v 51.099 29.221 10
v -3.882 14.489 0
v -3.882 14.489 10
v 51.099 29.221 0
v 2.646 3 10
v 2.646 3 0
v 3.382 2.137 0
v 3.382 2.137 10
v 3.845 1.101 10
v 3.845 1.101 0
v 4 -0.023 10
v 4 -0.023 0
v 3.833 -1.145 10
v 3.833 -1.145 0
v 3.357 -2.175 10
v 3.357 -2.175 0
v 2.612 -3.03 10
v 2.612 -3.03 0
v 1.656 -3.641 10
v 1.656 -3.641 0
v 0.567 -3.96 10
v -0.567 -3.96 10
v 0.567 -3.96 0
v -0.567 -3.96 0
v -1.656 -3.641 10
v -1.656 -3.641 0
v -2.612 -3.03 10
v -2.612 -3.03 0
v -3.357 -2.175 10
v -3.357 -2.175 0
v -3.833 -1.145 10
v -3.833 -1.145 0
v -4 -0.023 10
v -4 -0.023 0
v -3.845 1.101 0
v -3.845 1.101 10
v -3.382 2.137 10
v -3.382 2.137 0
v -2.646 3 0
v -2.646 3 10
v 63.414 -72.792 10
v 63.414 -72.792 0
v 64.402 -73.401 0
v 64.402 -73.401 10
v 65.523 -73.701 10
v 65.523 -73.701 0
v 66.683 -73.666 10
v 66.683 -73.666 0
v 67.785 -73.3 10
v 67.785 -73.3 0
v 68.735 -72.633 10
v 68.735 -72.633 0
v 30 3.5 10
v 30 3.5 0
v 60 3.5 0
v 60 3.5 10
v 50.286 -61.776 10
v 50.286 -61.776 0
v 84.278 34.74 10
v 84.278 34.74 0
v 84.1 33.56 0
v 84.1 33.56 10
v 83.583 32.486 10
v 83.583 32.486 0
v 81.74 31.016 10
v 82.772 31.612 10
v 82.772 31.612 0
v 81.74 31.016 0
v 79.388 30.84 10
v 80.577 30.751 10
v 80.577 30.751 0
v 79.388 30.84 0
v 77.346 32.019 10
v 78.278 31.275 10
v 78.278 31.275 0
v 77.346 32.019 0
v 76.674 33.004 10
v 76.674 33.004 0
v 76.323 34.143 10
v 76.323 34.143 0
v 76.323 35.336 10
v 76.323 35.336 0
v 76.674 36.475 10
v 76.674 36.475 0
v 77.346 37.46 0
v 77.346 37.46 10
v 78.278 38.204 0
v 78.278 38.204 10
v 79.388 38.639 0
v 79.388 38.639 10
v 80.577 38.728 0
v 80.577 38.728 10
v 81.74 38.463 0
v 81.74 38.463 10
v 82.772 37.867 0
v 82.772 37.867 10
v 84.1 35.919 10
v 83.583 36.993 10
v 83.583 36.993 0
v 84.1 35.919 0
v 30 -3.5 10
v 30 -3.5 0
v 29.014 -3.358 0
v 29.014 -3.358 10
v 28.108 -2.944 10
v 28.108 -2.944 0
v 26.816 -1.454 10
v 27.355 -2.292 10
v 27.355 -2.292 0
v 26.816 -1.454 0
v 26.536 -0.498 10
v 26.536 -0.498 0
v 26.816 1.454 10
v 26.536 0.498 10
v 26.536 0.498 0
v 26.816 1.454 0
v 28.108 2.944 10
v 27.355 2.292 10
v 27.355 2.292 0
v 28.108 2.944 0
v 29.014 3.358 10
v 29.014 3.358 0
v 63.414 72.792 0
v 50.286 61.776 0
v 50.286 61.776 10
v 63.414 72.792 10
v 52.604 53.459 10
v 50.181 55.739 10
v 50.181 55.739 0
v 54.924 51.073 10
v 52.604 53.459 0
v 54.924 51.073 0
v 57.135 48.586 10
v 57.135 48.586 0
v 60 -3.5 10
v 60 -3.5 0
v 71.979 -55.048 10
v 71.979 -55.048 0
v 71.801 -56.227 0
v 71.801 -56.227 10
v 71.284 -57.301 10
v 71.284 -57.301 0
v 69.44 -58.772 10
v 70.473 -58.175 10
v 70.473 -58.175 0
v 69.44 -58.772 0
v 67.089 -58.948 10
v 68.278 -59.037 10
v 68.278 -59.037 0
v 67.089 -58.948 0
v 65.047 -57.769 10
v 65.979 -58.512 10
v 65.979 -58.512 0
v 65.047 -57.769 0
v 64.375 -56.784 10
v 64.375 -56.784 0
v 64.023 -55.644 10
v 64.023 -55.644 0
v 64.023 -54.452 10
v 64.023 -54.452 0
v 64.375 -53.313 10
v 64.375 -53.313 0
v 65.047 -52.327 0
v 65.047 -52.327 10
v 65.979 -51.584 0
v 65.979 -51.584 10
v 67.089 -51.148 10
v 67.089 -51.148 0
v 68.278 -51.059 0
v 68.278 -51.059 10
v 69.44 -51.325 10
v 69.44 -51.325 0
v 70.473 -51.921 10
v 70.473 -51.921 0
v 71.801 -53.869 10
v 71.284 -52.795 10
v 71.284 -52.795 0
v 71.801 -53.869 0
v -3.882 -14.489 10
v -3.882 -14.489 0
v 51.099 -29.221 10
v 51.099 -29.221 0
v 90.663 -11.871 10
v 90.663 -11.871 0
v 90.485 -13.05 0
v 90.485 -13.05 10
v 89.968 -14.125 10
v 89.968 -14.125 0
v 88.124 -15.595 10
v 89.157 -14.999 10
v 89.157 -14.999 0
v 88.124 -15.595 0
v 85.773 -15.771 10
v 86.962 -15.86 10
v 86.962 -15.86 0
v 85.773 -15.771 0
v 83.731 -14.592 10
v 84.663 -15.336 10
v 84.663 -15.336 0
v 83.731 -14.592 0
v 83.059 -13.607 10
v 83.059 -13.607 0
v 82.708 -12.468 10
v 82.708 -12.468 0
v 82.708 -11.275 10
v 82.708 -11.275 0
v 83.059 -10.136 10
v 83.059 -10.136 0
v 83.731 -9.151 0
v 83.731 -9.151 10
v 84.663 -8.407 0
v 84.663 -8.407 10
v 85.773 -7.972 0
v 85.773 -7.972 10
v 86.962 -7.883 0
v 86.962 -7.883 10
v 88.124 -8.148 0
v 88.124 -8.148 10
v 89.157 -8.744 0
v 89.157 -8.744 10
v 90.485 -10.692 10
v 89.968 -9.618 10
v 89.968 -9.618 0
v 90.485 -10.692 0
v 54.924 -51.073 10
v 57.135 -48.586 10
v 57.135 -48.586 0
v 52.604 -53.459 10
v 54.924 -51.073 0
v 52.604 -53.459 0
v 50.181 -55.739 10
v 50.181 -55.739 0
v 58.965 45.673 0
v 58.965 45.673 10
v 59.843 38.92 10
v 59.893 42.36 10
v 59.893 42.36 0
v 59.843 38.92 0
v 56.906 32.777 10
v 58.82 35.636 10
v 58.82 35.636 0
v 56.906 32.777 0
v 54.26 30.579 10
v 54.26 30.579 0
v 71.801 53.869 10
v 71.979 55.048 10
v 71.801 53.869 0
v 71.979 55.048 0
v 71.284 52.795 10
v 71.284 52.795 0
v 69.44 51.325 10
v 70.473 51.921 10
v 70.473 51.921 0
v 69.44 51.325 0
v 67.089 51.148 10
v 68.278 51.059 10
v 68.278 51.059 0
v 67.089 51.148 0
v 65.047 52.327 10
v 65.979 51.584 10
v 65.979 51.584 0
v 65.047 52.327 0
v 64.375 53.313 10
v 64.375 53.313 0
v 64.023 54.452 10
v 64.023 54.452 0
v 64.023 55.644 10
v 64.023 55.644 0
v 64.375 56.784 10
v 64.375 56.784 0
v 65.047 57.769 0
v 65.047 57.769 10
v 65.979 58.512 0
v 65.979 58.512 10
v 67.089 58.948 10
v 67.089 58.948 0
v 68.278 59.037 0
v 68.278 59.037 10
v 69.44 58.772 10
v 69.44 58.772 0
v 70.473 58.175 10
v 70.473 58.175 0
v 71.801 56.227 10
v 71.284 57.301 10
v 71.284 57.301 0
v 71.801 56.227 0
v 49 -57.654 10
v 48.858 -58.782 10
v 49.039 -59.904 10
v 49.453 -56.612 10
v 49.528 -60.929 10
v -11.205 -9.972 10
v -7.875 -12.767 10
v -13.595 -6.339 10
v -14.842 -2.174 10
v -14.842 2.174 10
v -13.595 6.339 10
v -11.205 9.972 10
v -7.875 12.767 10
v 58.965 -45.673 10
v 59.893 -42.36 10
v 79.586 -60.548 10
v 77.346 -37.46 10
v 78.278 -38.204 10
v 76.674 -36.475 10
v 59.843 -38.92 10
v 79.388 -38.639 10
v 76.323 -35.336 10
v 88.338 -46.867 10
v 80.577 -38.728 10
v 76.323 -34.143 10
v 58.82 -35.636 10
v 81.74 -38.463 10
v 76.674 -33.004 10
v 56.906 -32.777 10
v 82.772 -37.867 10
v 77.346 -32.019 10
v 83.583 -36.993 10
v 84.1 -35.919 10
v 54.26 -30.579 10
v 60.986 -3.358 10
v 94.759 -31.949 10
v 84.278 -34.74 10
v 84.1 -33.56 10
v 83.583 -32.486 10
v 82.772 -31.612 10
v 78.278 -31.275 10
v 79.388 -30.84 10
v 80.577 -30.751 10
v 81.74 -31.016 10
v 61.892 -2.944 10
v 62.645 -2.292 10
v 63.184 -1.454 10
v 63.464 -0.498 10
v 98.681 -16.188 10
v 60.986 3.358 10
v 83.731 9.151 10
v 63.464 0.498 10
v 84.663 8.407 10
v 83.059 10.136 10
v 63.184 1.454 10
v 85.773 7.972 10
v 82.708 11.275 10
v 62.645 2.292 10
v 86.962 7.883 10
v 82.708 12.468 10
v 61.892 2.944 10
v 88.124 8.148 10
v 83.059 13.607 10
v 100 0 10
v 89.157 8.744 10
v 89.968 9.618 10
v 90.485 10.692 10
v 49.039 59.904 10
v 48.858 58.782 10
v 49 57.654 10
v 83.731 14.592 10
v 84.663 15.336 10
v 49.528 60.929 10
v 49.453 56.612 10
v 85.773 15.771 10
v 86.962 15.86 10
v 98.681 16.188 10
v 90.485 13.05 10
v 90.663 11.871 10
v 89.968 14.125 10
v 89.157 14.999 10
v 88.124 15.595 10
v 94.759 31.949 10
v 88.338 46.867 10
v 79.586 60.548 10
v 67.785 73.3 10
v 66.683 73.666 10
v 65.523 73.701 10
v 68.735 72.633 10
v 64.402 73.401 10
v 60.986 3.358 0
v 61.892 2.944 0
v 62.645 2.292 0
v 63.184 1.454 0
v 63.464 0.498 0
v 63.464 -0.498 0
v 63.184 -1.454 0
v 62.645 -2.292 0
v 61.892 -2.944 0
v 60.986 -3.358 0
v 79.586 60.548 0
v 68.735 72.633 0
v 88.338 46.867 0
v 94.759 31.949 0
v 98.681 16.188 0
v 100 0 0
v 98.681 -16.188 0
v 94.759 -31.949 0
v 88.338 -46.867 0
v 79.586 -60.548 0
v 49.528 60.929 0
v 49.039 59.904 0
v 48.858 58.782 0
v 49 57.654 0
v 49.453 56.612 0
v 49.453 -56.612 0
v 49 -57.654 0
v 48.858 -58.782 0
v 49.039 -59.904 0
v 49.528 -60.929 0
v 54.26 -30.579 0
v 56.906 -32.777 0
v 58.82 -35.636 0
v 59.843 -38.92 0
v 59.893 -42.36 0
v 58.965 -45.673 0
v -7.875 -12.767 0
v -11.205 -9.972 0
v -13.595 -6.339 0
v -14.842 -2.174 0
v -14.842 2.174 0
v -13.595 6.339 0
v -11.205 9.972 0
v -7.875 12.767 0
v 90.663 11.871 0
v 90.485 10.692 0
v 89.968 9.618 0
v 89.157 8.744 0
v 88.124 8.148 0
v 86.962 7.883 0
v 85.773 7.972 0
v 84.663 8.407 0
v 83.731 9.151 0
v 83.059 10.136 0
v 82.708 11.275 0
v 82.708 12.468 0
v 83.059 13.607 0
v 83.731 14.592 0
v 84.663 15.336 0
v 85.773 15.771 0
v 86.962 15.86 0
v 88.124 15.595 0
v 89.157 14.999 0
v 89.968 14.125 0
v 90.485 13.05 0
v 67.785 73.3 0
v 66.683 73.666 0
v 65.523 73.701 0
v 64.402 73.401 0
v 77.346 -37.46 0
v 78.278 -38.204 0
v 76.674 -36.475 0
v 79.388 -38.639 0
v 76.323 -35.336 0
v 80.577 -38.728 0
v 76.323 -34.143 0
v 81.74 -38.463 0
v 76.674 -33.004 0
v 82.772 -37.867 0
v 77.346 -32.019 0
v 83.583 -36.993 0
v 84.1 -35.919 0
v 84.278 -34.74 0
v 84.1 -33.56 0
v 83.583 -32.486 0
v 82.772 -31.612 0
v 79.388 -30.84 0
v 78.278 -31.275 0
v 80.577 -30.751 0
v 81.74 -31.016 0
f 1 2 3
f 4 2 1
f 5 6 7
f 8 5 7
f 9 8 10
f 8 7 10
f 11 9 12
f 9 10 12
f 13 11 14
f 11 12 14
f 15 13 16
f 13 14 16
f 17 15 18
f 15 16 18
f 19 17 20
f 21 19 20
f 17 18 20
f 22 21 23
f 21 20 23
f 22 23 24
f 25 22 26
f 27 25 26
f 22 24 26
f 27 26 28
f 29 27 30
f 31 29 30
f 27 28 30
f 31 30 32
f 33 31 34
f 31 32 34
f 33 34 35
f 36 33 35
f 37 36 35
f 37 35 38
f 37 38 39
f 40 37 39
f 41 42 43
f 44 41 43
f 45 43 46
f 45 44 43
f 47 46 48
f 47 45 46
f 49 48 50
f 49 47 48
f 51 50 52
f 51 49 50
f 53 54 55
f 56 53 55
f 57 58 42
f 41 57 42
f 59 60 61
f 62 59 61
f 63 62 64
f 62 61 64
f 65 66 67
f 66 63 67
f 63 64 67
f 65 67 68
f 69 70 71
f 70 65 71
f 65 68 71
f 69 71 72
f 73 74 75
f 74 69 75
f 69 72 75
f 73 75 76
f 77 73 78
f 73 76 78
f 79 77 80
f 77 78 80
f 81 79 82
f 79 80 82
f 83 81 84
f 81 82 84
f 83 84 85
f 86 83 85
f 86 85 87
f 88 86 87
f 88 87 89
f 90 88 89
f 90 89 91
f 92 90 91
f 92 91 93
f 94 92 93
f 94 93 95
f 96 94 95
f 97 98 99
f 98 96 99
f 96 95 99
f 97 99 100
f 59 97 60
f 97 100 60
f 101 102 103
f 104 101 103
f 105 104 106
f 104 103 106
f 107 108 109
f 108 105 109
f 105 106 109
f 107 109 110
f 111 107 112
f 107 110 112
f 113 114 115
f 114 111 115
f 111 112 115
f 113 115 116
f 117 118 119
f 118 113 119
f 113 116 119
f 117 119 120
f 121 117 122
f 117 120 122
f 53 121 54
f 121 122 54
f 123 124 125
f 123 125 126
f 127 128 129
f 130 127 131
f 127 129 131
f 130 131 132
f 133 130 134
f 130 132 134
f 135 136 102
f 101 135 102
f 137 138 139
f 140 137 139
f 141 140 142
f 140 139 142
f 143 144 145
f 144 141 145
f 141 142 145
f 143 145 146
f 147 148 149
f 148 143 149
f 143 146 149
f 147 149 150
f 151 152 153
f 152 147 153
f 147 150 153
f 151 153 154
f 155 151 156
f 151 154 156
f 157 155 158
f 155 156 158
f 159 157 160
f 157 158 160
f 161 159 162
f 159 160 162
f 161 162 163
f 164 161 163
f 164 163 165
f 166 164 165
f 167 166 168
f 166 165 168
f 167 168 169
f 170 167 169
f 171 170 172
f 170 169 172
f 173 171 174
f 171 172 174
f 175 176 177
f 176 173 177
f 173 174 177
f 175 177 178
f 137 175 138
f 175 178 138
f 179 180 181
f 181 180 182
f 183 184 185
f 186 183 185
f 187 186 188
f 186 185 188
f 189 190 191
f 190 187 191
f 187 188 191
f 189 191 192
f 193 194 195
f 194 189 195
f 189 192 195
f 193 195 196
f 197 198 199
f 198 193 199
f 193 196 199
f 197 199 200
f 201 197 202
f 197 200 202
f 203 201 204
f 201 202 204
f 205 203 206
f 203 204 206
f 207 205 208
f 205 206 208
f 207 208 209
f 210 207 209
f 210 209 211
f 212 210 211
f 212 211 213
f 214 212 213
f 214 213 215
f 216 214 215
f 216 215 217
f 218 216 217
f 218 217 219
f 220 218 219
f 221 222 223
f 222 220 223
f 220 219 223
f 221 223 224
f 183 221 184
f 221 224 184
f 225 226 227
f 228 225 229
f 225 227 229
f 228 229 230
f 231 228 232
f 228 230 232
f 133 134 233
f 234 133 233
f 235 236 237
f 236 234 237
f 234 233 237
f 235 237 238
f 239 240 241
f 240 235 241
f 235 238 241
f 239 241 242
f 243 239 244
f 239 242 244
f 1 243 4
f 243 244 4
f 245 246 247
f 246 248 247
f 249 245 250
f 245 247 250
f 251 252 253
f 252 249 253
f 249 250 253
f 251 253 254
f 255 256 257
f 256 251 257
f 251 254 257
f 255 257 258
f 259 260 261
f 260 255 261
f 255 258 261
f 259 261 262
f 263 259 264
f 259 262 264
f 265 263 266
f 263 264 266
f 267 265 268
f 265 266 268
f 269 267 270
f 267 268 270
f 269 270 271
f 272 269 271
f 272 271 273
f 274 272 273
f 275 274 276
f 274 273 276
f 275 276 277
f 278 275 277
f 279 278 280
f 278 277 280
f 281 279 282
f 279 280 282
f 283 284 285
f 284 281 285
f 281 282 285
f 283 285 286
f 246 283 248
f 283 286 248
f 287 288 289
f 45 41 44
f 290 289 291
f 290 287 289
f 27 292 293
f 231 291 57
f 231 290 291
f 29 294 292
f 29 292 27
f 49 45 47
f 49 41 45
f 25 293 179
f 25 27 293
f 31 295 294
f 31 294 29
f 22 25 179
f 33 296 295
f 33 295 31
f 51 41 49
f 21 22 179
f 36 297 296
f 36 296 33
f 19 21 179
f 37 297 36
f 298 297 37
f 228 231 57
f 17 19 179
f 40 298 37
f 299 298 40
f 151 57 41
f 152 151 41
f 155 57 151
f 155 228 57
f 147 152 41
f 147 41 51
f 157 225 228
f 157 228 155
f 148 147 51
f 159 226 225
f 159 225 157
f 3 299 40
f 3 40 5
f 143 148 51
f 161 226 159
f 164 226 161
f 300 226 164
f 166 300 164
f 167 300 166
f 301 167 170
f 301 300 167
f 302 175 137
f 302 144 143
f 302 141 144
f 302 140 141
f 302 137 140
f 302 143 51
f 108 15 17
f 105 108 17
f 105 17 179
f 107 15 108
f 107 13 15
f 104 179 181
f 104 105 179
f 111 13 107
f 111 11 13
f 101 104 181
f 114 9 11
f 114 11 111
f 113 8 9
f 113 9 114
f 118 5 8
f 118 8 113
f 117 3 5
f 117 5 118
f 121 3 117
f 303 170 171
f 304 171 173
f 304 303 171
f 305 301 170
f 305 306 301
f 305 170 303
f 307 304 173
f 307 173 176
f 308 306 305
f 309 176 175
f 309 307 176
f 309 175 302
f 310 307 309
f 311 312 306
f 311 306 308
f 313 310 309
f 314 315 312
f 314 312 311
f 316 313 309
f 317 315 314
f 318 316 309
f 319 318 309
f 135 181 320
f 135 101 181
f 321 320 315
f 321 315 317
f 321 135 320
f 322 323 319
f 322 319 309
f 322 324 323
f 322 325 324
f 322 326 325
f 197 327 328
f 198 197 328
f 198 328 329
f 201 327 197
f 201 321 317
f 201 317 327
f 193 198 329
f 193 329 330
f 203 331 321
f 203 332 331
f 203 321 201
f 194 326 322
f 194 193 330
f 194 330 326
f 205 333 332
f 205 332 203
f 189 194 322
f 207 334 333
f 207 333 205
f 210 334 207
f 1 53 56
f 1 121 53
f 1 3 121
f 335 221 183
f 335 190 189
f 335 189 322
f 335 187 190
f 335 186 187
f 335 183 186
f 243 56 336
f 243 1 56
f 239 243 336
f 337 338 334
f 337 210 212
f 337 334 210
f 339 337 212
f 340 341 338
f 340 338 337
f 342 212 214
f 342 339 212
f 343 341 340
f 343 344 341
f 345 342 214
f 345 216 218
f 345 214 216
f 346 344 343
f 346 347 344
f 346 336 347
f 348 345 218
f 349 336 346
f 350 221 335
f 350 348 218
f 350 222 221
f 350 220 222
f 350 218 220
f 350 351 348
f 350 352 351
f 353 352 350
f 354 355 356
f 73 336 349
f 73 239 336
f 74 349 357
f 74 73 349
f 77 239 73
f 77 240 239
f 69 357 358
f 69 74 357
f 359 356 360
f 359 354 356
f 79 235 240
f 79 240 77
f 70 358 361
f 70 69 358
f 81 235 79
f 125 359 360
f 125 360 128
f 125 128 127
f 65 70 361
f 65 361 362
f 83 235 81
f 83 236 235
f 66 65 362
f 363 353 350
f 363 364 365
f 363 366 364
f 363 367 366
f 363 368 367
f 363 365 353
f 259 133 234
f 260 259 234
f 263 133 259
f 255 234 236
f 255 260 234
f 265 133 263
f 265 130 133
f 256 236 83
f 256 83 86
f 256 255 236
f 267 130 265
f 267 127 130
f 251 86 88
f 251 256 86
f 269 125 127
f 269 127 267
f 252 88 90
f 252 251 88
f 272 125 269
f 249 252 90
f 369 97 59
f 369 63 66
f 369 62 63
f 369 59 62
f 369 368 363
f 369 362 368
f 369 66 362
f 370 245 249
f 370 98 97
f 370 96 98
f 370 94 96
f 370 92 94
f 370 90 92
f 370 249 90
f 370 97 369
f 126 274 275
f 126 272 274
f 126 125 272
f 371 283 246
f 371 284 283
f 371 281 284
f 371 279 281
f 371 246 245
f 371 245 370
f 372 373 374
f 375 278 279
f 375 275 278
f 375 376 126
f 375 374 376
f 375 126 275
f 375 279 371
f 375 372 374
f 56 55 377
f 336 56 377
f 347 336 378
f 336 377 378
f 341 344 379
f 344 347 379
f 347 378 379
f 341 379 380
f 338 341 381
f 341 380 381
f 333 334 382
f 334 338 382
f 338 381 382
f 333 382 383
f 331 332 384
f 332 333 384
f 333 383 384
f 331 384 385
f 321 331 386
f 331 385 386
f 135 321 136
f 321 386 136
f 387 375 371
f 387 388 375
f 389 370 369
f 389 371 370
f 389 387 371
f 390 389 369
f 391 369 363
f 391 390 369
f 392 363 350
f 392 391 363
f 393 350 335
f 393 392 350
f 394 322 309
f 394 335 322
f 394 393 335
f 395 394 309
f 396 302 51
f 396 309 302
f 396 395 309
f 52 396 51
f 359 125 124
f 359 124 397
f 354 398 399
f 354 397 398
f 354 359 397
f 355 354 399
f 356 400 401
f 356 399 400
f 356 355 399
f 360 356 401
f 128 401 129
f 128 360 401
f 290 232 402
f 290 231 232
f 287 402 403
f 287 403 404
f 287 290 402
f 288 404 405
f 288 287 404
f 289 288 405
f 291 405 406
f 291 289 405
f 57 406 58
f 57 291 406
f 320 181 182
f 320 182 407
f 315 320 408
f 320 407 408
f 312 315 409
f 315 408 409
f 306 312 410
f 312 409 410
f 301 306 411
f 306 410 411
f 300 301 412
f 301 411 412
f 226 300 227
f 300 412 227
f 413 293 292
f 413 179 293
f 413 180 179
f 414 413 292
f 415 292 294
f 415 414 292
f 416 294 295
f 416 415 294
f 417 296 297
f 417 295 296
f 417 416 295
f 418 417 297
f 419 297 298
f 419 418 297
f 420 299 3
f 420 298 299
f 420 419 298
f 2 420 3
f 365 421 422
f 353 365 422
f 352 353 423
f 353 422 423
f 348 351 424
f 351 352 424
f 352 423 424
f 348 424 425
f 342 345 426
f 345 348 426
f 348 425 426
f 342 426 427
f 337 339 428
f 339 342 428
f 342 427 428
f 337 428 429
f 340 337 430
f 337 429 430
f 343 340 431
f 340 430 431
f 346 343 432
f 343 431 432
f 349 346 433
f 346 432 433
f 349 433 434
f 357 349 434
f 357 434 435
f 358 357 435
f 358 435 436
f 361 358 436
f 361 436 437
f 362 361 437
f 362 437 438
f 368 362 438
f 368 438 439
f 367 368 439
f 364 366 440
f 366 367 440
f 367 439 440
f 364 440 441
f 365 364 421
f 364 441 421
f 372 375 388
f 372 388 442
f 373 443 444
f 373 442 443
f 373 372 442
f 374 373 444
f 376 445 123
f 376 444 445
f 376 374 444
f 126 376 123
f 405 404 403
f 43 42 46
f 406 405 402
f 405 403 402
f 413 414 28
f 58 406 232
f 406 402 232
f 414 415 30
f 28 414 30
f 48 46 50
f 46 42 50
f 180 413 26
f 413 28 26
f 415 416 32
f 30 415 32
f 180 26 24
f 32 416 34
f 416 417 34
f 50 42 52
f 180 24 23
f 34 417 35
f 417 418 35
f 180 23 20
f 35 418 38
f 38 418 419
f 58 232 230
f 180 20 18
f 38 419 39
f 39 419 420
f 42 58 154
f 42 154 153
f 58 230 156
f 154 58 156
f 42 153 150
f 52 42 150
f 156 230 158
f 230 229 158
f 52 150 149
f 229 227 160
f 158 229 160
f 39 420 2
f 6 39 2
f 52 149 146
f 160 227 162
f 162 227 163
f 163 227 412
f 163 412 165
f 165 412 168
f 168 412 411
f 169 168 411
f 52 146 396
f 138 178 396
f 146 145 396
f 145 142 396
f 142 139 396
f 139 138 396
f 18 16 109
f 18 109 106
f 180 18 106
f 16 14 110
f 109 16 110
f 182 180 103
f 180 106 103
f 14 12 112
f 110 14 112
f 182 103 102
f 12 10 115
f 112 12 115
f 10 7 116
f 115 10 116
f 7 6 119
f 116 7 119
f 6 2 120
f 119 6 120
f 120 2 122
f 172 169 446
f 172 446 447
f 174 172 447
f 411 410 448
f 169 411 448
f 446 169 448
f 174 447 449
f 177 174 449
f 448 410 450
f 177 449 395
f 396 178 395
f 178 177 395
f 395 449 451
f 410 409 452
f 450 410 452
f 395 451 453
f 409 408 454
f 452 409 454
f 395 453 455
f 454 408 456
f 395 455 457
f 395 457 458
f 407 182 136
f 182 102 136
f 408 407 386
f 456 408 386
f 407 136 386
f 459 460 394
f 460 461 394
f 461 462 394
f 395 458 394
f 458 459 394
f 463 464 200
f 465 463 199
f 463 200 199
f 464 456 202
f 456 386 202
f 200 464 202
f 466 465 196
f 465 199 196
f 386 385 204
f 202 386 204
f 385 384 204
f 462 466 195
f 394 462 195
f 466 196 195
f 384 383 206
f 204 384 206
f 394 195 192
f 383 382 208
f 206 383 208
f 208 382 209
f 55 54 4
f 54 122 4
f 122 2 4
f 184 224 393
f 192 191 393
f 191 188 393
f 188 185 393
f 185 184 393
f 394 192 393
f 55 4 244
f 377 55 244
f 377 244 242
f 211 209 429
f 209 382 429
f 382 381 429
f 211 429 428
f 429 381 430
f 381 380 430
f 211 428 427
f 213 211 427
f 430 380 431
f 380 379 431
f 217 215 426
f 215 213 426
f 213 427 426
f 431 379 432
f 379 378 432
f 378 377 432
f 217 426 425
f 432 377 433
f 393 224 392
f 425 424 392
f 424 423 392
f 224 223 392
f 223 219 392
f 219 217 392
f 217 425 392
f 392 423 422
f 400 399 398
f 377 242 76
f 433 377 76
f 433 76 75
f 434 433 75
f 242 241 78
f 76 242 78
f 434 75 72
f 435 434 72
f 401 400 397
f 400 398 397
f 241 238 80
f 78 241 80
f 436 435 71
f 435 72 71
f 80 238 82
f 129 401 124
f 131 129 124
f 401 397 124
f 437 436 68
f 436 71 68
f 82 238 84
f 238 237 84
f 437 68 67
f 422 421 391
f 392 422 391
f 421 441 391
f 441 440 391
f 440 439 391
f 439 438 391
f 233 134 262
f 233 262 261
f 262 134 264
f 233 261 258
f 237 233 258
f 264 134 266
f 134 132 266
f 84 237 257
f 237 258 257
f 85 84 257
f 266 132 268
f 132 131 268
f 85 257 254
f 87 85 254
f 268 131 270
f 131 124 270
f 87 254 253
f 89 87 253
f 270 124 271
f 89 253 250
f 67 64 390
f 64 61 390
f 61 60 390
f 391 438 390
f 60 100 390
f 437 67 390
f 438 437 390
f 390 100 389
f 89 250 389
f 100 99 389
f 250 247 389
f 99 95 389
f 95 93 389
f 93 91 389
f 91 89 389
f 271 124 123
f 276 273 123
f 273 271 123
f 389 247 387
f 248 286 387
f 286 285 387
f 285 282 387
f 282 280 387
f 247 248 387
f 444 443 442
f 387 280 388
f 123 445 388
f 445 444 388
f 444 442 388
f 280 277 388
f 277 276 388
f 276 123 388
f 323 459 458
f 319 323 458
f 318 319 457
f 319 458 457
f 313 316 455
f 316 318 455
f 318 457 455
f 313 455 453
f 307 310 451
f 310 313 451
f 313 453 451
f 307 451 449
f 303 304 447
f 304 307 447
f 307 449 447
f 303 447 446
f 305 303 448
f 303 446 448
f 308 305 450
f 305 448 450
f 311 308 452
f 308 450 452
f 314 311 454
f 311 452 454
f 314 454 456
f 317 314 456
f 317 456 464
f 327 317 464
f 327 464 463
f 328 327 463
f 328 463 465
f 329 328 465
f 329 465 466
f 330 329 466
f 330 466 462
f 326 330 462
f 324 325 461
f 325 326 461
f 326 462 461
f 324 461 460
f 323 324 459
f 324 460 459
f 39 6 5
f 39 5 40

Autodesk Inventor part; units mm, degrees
ref_plane "YZ Plane" through (0, 0, 0) normal (1, 0, 0) x (0, 1, 0)
ref_plane "XZ Plane" through (0, 0, 0) normal (0, 1, 0) x (-1, 0, 0)
ref_plane "XY Plane" through (0, 0, 0) normal (0, 0, 1) x (1, 0, 0)
sketch "Skizze1" plane through (0, 0, 0) normal (0, 0, 1) x (1, 0, 0)
  circle A0 centre (0, 0) radius 15
  circle A1 centre (0, 0) radius 4
  line L0 (0, 0) -> (15, 0) construction
  line L1 (-9.6418, 11.4907) -> (66.0959, 75.0422) construction
  line L2 (-9.6418, -11.4907) -> (66.0959, -75.0422) construction
  line L3 (66.0959, 75.0422) -> (66.0959, -75.0422) construction
  arc A2 (66.0959, -75.0422) -> (66.0959, 75.0422) centre (0, 0) ccw
  arc A3 (46.6507, -58.7257) -> (46.6507, 58.7257) centre (0, 0) ccw
  line L4 (46.6507, 58.7257) -> (66.0959, 75.0422)
  line L5 (46.6507, -58.7257) -> (66.0959, -75.0422)
  arc A4 (51.0992, 29.2211) -> (57.1349, 48.586) centre (47.9933, 40.8122) ccw
  line L6 (-3.8823, 14.4889) -> (51.0992, 29.2211)
  line L7 (-3.8823, -14.4889) -> (51.0992, -29.2211)
  arc A5 (57.1349, -48.586) -> (51.0992, -29.2211) centre (47.9933, -40.8122) ccw
  line L8 (30, 0) -> (60, 0) construction
  line L9 (30, 3.5) -> (60, 3.5)
  line L10 (60, -3.5) -> (30, -3.5)
  arc A6 (30, 3.5) -> (30, -3.5) centre (30, 0) ccw
  arc A7 (60, -3.5) -> (60, 3.5) centre (60, 0) ccw
  line L11 (0, 0) -> (66.0959, 0) construction
  arc A8 (56.3733, -66.8839) -> (56.3733, 66.8839) centre (0, 0) ccw construction
  circle A9 centre (67.9788, 55.0481) radius 4
  line L12 (67.9788, 55.0481) -> (0, 0) construction
  circle A10 centre (80.2782, 34.7395) radius 4
  circle A11 centre (86.6631, 11.8714) radius 4
  circle A12 centre (86.6631, -11.8714) radius 4
  circle A13 centre (80.2782, -34.7395) radius 4
  circle A14 centre (67.9788, -55.0481) radius 4
  line L13 (2.6458, 3) -> (-2.6458, 3)
  point P0 (75, 0)
  point P1 (45, 0)
  dimension "d0" = 8
  dimension "d1" = 30
  dimension "d2" = 40
  dimension "d3" = 100
  dimension "d4" = 25
  dimension "d5" = 12
  dimension "d6" = 15
  dimension "d7" = 12
  dimension "d8" = 15
  dimension "d10" = 60
  dimension "d13" = 0
  dimension "d14" = 30
  dimension "d15" = 7
  dimension "d16" = 30
  dimension "d27" = 8
  dimension "d28" = 80
  dimension "d29" = 1
  dimension "d32" = 78
  dimension "d35" = 3
extrude "Extrusion1" add sketch "Skizze1" along normal blind 10 contours A0 | A0 L6 A4 A3 A5 L7 | A3 L4 A2 L5 | L13 A1 picked at (-0.6179, 3.1815)
fillet "Rundung1" radius 4 4 edges at (66.0959, 75.0422, 5) (66.0959, -75.0422, 5) (46.6507, 58.7257, 5) (46.6507, -58.7257, 5)
equation "\"d7\" = d5"
equation "\"d8\" = d6"
equation "\"d14\" = 0.5 * d10"
equation "\"d32\" = d28 - 2 * d29"
properties part number "ParallelMecha_Capstondisc_V3"
